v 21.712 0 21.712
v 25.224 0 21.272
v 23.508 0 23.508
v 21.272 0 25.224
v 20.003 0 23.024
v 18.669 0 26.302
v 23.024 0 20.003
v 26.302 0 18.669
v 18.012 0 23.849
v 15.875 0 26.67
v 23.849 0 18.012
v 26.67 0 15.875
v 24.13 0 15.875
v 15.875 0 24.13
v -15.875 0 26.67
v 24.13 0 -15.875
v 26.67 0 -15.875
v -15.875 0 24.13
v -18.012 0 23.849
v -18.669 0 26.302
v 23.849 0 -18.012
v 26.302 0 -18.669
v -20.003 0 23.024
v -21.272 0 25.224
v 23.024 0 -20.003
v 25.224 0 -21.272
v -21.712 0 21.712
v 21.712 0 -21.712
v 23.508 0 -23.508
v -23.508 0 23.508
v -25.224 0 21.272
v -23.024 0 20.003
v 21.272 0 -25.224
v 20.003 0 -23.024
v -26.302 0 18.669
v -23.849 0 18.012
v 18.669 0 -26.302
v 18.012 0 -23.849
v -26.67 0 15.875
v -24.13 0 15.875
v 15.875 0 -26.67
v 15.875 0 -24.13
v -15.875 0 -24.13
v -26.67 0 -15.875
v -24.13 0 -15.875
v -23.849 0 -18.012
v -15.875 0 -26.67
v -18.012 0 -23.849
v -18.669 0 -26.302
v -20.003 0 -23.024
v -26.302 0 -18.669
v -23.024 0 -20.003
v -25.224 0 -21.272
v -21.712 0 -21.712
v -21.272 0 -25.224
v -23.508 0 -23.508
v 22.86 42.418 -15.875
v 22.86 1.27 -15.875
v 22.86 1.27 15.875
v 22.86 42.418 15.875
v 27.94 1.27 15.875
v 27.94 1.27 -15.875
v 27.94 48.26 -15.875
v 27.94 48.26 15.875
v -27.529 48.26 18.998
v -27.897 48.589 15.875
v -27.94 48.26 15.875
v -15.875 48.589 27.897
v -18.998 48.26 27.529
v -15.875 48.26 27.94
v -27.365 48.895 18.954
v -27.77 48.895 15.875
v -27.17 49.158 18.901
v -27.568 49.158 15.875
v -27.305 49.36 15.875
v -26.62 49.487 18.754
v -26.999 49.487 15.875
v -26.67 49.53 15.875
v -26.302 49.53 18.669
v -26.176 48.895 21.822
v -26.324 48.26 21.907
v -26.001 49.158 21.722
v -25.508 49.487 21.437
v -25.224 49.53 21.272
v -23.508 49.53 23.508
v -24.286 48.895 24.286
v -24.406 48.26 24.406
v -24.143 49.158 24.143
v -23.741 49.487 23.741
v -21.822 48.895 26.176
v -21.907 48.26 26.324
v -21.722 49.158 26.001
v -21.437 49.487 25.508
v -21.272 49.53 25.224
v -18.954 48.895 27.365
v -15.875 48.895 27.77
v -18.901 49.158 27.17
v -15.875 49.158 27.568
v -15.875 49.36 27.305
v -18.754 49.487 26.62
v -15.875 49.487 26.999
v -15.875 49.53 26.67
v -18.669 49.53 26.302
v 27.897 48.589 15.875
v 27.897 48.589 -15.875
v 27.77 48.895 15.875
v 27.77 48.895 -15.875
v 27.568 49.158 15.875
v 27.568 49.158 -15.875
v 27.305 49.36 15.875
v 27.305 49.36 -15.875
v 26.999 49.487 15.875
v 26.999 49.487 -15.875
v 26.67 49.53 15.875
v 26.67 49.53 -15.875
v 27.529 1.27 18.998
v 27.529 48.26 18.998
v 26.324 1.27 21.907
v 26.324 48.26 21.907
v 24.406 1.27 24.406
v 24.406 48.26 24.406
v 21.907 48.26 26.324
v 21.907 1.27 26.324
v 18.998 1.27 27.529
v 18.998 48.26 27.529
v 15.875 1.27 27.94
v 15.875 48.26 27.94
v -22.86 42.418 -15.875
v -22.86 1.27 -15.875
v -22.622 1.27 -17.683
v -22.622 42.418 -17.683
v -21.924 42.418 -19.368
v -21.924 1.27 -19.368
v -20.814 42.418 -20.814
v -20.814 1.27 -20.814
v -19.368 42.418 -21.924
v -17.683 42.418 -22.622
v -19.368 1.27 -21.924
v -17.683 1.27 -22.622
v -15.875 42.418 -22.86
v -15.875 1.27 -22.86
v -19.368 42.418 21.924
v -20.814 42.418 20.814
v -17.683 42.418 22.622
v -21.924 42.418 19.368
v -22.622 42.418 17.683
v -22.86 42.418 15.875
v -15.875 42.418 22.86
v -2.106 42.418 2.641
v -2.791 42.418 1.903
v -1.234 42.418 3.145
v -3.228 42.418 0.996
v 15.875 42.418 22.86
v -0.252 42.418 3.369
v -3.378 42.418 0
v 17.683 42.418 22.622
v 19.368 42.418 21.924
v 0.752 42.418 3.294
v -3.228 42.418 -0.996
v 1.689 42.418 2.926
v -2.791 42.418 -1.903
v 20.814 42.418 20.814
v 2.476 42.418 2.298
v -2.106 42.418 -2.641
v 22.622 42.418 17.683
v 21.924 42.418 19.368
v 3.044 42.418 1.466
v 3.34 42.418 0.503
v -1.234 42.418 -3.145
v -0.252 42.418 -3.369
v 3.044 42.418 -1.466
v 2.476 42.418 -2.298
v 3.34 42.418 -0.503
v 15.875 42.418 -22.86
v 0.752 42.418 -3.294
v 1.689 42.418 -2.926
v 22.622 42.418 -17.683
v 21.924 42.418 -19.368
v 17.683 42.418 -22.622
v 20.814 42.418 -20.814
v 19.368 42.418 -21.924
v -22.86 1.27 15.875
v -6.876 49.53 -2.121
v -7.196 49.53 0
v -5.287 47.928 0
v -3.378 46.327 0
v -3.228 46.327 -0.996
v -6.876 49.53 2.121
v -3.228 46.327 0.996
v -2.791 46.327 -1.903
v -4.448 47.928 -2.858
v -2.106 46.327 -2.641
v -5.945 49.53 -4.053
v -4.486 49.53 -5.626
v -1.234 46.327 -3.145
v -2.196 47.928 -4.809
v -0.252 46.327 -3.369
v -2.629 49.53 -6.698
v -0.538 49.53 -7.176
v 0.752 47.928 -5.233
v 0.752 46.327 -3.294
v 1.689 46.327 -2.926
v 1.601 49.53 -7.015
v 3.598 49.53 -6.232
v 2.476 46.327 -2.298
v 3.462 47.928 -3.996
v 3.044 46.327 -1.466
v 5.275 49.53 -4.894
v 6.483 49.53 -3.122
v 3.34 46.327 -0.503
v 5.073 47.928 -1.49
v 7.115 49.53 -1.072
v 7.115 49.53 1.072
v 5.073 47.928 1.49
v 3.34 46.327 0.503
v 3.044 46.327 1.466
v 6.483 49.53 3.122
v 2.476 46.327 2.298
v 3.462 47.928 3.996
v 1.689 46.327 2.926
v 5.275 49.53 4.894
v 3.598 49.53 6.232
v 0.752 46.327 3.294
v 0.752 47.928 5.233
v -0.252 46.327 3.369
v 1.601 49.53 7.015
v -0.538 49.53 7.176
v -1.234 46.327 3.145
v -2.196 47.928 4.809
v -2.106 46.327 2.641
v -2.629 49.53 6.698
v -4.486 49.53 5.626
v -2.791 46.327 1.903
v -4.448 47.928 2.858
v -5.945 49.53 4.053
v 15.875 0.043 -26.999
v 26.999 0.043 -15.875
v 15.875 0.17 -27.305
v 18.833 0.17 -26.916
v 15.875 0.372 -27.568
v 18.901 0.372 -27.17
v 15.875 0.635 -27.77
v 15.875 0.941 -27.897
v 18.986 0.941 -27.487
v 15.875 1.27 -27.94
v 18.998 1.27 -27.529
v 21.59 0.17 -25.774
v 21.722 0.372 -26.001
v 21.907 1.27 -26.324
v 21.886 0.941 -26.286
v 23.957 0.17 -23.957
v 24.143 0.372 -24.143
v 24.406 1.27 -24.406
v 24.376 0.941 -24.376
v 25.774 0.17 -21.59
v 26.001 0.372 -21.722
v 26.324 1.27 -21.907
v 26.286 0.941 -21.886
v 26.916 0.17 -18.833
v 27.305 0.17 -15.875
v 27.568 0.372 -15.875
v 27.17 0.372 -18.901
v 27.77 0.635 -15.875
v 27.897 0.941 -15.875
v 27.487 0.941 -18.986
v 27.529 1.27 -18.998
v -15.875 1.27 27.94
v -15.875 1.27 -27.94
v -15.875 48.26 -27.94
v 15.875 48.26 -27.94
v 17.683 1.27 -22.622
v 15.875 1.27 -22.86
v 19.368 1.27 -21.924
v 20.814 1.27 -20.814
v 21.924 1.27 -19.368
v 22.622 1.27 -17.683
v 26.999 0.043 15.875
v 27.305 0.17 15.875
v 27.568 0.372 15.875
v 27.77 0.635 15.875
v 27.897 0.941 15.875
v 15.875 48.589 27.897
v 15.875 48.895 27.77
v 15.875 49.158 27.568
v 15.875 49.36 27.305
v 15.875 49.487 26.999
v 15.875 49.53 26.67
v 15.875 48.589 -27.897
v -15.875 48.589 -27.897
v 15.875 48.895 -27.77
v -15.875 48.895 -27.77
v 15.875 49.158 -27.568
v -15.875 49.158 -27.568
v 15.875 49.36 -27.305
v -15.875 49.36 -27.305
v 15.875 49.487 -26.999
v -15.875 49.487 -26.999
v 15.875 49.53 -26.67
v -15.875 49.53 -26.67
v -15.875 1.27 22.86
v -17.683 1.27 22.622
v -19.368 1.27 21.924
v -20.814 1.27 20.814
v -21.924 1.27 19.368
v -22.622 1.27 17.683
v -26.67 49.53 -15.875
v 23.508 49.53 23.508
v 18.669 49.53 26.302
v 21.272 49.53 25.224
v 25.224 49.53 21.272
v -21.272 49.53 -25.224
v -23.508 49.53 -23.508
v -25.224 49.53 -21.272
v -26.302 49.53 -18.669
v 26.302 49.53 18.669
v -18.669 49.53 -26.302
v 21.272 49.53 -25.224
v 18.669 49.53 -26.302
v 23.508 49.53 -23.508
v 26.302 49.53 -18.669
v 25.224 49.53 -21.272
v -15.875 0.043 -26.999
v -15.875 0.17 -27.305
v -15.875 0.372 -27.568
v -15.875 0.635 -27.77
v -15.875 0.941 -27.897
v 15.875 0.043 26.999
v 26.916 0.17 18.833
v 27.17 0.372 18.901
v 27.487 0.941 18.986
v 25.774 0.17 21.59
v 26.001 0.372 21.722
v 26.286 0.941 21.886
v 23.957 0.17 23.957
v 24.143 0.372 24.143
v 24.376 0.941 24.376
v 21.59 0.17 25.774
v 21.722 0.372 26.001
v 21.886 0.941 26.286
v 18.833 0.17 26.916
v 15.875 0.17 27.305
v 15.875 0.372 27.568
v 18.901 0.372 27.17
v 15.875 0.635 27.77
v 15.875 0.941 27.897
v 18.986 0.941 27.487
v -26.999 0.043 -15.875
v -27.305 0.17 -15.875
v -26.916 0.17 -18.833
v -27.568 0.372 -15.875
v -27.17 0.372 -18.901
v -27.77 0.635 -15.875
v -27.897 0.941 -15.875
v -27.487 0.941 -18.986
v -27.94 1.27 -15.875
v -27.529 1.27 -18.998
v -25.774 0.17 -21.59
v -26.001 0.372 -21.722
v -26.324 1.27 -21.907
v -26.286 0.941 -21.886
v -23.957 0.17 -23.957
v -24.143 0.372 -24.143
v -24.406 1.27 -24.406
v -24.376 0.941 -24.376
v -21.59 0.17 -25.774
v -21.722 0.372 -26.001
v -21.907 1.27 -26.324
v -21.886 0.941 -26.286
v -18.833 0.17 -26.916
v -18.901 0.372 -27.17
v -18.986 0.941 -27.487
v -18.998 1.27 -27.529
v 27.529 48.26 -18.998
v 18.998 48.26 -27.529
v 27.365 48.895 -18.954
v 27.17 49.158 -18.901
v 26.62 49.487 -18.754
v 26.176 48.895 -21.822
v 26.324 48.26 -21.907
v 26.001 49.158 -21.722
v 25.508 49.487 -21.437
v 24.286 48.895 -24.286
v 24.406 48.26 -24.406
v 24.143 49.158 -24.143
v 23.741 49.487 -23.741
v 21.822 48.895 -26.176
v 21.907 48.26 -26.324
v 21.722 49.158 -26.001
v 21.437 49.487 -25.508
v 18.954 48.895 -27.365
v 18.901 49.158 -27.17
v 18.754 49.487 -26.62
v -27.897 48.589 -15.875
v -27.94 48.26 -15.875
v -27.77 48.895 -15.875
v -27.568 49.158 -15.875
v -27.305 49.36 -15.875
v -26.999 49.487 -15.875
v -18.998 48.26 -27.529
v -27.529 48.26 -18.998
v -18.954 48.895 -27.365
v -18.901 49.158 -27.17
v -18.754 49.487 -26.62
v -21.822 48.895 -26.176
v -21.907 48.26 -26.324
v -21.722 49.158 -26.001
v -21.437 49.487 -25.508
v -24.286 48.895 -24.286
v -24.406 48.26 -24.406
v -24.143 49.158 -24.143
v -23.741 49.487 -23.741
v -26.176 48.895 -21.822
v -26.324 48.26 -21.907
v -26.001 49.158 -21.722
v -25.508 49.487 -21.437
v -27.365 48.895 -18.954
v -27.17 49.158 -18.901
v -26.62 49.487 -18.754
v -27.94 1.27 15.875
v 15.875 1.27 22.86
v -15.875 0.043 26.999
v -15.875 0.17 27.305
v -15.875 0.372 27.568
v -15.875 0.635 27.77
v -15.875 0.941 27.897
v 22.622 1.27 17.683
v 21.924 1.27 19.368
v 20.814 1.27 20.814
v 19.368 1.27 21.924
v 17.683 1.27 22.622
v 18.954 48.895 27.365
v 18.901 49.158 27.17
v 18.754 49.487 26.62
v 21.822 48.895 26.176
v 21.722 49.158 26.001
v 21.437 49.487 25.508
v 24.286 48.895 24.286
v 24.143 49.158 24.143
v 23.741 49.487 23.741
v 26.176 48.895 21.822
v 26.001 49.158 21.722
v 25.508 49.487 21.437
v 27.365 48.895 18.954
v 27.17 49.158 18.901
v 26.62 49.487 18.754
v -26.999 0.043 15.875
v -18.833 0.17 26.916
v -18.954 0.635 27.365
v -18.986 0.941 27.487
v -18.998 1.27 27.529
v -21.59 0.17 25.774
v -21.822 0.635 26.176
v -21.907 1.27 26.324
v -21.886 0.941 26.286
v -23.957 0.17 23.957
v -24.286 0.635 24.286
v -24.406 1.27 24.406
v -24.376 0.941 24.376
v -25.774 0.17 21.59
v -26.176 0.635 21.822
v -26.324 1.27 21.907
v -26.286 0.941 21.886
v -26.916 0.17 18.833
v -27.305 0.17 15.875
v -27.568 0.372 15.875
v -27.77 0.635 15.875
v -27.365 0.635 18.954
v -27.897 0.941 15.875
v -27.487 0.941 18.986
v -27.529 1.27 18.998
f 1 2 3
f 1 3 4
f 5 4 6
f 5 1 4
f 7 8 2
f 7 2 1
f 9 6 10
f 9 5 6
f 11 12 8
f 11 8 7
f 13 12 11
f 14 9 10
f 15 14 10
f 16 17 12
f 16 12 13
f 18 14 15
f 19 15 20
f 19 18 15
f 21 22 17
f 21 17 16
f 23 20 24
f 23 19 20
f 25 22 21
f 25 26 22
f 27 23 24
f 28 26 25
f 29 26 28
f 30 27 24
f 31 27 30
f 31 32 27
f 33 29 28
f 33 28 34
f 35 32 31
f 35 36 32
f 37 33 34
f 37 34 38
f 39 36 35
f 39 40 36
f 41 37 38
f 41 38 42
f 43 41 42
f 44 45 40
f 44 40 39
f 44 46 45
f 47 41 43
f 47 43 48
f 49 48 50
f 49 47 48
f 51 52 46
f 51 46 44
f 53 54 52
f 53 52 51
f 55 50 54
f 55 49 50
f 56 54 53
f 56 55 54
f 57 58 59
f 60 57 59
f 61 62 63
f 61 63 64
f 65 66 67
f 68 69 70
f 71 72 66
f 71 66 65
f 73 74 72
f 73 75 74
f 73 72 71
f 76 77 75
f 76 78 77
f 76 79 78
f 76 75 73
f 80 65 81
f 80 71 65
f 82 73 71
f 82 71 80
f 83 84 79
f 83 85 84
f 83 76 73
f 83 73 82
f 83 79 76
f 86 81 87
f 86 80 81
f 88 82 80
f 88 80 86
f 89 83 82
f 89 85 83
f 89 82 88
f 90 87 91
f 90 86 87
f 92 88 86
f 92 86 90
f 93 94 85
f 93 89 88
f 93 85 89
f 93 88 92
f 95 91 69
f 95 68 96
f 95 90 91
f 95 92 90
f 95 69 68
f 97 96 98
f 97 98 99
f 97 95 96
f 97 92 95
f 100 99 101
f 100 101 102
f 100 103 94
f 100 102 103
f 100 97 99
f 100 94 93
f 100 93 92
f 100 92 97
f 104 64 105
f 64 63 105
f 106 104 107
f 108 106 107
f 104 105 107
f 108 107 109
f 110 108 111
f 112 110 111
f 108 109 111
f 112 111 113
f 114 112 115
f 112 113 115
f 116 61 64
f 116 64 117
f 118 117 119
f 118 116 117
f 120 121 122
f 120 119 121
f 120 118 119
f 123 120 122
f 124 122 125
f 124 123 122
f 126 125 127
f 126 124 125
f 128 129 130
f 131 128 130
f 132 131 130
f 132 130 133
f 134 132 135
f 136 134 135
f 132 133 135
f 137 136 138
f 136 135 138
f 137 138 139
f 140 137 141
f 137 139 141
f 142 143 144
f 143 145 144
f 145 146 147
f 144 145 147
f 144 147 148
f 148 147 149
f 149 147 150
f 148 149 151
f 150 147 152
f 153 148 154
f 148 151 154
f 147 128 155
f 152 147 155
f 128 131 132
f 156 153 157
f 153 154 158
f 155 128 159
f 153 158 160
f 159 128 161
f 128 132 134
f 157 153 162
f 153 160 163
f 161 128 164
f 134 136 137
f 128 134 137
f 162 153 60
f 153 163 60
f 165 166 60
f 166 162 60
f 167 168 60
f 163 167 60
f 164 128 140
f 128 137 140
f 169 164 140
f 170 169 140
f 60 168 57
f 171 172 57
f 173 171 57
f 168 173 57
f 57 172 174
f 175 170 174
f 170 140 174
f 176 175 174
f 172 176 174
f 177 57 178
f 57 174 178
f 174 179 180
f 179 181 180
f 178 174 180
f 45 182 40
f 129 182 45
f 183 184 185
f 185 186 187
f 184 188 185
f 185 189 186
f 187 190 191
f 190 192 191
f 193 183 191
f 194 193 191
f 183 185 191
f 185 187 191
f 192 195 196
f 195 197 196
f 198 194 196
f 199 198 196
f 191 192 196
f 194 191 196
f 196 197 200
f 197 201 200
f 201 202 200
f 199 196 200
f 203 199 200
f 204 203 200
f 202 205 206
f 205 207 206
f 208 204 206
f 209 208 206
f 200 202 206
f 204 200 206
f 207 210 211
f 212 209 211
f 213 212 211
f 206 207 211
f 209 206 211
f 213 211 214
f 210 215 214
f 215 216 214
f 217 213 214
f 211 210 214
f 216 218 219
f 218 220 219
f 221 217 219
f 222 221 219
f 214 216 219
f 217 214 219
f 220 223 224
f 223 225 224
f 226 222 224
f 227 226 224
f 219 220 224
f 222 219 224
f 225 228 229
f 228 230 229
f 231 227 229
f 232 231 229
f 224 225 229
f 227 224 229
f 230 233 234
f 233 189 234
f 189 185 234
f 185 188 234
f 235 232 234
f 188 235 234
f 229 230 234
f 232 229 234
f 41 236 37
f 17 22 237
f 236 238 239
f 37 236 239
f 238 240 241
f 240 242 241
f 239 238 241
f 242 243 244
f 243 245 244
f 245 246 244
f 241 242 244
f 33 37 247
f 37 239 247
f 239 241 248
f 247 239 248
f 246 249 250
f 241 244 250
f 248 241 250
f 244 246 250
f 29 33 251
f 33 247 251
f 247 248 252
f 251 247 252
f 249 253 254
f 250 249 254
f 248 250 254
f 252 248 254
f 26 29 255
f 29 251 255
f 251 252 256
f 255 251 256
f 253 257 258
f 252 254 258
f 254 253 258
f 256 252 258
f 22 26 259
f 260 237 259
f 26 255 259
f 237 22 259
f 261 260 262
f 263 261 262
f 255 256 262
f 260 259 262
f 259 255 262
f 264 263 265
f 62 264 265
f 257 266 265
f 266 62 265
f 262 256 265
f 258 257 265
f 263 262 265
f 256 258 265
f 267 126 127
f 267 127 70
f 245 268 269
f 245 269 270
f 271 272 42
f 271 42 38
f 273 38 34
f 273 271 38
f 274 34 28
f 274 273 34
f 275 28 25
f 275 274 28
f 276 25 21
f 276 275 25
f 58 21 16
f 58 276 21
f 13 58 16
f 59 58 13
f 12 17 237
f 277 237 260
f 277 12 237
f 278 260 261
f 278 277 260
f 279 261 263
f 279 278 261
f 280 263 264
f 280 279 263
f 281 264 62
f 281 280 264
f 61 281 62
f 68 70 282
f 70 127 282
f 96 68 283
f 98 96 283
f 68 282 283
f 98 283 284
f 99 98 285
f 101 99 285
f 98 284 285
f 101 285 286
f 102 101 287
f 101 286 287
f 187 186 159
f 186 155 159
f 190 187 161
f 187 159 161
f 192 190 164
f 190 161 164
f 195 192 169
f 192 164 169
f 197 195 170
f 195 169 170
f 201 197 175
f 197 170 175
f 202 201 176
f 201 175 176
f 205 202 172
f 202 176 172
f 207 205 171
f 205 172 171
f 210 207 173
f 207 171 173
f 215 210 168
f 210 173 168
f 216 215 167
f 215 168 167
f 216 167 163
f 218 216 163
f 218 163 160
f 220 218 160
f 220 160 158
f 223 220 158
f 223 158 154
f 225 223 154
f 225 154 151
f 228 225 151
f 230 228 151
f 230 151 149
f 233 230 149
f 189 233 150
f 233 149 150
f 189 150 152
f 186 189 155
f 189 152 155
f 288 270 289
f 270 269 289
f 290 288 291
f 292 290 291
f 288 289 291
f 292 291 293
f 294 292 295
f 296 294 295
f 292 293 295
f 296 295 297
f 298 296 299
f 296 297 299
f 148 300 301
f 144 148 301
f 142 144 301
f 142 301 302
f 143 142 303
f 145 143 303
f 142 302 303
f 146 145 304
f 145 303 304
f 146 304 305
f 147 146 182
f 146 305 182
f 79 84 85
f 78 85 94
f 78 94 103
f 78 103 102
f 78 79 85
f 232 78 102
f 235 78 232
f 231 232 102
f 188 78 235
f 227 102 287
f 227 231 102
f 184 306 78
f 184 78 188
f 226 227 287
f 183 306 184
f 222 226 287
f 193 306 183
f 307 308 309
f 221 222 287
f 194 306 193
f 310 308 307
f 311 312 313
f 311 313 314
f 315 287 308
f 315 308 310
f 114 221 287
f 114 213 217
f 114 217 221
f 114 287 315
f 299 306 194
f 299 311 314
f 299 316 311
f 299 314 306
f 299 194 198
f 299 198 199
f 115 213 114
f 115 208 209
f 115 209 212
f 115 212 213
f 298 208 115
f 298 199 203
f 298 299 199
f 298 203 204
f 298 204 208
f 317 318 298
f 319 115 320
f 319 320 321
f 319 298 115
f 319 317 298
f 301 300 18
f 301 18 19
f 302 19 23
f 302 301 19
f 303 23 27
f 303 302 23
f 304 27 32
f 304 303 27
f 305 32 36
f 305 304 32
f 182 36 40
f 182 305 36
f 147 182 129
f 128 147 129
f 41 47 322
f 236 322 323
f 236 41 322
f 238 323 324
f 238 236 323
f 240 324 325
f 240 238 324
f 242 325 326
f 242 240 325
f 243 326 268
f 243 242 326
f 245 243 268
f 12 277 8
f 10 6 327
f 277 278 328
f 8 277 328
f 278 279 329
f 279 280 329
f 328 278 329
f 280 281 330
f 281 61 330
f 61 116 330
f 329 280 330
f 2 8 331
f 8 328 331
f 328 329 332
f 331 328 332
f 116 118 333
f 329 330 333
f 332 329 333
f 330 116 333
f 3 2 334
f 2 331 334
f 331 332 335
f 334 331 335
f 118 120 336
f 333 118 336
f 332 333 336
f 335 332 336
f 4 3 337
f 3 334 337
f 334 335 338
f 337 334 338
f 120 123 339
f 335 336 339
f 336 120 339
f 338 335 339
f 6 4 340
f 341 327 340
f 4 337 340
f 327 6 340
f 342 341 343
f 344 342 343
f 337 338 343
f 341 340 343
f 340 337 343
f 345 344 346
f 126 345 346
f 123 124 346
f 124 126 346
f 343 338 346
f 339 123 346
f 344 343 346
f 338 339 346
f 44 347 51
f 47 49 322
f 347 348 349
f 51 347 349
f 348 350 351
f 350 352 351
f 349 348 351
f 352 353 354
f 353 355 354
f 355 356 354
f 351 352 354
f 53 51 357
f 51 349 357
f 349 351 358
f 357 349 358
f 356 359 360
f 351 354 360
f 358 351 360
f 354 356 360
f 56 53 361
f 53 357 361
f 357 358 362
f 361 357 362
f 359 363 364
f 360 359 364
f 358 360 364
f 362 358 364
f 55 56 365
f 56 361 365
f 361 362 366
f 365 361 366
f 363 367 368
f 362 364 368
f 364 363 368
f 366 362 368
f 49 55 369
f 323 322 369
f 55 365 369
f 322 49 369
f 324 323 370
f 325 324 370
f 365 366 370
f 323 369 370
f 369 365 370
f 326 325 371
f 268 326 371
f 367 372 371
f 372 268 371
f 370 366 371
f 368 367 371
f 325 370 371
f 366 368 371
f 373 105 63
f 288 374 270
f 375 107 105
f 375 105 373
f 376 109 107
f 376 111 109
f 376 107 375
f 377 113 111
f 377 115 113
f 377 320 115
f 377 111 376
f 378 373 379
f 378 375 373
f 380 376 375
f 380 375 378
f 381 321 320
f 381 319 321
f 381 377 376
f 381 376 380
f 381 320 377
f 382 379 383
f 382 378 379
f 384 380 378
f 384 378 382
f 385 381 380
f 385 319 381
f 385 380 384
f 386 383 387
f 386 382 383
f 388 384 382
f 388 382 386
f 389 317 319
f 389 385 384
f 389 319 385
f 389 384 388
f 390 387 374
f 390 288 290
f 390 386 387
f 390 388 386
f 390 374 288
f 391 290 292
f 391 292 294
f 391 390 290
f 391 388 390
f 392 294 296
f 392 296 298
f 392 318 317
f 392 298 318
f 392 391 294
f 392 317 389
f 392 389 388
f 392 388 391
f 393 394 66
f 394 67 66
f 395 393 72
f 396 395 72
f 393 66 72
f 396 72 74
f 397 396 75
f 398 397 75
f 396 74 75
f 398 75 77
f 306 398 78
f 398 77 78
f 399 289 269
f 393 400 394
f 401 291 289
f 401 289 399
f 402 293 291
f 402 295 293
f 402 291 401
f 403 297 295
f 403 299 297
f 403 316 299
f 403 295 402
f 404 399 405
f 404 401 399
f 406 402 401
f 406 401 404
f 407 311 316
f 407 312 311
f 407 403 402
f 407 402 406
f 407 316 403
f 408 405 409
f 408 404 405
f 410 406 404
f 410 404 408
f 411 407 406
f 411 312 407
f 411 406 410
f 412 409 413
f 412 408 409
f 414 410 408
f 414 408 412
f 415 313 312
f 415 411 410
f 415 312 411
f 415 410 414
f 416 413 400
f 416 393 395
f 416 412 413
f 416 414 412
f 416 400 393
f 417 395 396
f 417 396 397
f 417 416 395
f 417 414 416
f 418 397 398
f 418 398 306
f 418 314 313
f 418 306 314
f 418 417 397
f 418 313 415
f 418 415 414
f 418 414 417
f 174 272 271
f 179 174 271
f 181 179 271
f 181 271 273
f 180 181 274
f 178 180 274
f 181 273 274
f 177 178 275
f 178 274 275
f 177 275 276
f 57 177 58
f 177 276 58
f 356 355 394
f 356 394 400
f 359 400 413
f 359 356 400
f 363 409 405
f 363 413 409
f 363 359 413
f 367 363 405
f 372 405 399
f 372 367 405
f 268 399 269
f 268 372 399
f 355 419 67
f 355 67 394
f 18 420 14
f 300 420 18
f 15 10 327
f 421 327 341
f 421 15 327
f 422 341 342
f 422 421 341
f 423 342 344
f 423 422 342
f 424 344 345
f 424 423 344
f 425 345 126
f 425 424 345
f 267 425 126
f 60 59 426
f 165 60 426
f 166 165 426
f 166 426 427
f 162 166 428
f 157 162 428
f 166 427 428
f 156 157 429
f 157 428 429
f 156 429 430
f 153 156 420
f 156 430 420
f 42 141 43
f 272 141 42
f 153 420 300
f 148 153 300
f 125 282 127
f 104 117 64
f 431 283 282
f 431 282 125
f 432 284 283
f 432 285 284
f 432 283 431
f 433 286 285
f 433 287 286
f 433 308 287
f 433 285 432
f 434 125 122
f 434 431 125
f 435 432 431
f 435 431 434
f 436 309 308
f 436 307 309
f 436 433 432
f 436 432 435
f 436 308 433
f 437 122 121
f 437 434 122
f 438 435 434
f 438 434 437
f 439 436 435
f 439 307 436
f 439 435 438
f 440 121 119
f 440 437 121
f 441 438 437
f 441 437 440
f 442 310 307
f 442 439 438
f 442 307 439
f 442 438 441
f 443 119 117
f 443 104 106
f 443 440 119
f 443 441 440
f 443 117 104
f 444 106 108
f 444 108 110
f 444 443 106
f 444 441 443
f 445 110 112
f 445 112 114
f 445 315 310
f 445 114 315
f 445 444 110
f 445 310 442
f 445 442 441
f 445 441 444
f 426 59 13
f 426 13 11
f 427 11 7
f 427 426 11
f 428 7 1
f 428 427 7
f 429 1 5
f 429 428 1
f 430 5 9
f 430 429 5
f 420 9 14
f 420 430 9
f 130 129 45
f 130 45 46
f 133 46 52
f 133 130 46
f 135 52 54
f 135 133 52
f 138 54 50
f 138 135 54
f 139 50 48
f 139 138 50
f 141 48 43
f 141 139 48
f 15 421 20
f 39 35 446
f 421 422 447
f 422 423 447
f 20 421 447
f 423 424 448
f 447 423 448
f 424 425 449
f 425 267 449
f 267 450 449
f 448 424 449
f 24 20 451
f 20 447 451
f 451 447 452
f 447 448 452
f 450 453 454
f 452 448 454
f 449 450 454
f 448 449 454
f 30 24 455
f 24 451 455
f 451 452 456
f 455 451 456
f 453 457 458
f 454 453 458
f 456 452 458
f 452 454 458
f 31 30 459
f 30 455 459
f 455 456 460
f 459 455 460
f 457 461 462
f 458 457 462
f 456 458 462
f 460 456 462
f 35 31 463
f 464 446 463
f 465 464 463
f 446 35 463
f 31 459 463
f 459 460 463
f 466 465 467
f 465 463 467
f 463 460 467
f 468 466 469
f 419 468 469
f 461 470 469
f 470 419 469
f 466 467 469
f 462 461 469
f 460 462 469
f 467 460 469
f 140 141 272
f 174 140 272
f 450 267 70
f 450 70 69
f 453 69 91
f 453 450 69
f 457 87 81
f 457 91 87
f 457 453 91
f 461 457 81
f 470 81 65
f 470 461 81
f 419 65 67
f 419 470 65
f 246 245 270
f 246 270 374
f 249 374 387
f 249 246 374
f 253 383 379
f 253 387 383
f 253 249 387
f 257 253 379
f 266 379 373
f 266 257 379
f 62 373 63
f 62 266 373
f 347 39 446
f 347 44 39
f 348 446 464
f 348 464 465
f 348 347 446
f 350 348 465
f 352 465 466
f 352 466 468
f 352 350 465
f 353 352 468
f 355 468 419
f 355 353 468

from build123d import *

# Parameters (mm, degrees)
BOSS_EXTRUDE1_DEPTH                                 = 6.35
BOSS_EXTRUDE1_DEPTH_BACK                            = 0.762
BOSS_EXTRUDE2_DEPTH                                 = 42.418
CSK_FOR_1_4_FLAT_HEAD_MACHINE_SCREW_100_D           = 6.7564
CSK_FOR_1_4_FLAT_HEAD_MACHINE_SCREW_100_CSINK_D     = 14.3913352
CSK_FOR_1_4_FLAT_HEAD_MACHINE_SCREW_100_CSINK_ANGLE = 100
FILLET1_R                                           = 1.27
CHAMFER1_SIZE                                       = 1.27
FILLET2_R                                           = 1.27


with BuildPart() as part:
    # Sketch2 → Boss-Extrude1 (new, two sides: drawn at the far end of the back side and taken through both)
    with BuildSketch(Plane(origin=(0, 43.18, 0), x_dir=(1, 0, 0), z_dir=(0, 1, 0)).offset(-BOSS_EXTRUDE1_DEPTH_BACK)):
        with BuildLine():
            Line((-27.94, 15.875), (-27.94, -15.875))
            ThreePointArc((-27.94, -15.875), (-24.406243315, -24.406243315), (-15.875, -27.94))
            Line((-15.875, -27.94), (15.875, -27.94))
            ThreePointArc((15.875, -27.94), (24.406243315, -24.406243315), (27.94, -15.875))
            Line((27.94, -15.875), (27.94, 15.875))
            ThreePointArc((27.94, 15.875), (24.406243315, 24.406243315), (15.875, 27.94))
            Line((15.875, 27.94), (-15.875, 27.94))
            ThreePointArc((-15.875, 27.94), (-24.406243315, 24.406243315), (-27.94, 15.875))
        make_face()
    extrude(amount=BOSS_EXTRUDE1_DEPTH + BOSS_EXTRUDE1_DEPTH_BACK)

    # Sketch1 → Boss-Extrude2 (add)
    with BuildSketch(Plane(origin=(0, 0, 0), x_dir=(1, 0, 0), z_dir=(0, 1, 0))):
        with BuildLine():
            Line((-27.94, -15.875), (-27.94, 15.875))
            ThreePointArc((-27.94, 15.875), (-24.406243315, 24.406243315), (-15.875, 27.94))
            Line((-15.875, 27.94), (15.875, 27.94))
            ThreePointArc((15.875, 27.94), (24.406243315, 24.406243315), (27.94, 15.875))
            Line((27.94, 15.875), (27.94, -15.875))
            ThreePointArc((27.94, -15.875), (24.406243315, -24.406243315), (15.875, -27.94))
            Line((15.875, -27.94), (-15.875, -27.94))
            ThreePointArc((-15.875, -27.94), (-24.406243315, -24.406243315), (-27.94, -15.875))
        make_face()
        with BuildLine():
            Line((-22.86, -15.875), (-22.86, 15.875))
            ThreePointArc((-22.86, 15.875), (-20.814140867, 20.814140867), (-15.875, 22.86))
            Line((-15.875, 22.86), (15.875, 22.86))
            ThreePointArc((15.875, 22.86), (20.814140867, 20.814140867), (22.86, 15.875))
            Line((22.86, 15.875), (22.86, -15.875))
            ThreePointArc((22.86, -15.875), (20.814140867, -20.814140867), (15.875, -22.86))
            Line((15.875, -22.86), (-15.875, -22.86))
            ThreePointArc((-15.875, -22.86), (-20.814140867, -20.814140867), (-22.86, -15.875))
        make_face(mode=Mode.SUBTRACT)
    extrude(amount=BOSS_EXTRUDE2_DEPTH)

    # CSK for 1/4 Flat Head Machine Screw (100)1 (through all)
    with Locations(Plane(origin=(0, 49.53, 0), x_dir=(1, 0, 0), z_dir=(0, 1, 0))):
        with Locations((0, 0)):
            CounterSinkHole(CSK_FOR_1_4_FLAT_HEAD_MACHINE_SCREW_100_D / 2, CSK_FOR_1_4_FLAT_HEAD_MACHINE_SCREW_100_CSINK_D / 2, counter_sink_angle=CSK_FOR_1_4_FLAT_HEAD_MACHINE_SCREW_100_CSINK_ANGLE)

    # Fillet1
    fillet1_edges = [part.edges().sort_by_distance(p)[0] for p in [
        (24.406243315, 49.53, 24.406243315),
        (27.94, 49.53, 0),
        (24.406243315, 49.53, -24.406243315),
        (0, 49.53, -27.94),
        (-24.406243315, 49.53, -24.406243315),
        (-27.94, 49.53, 0),
        (-24.406243315, 49.53, 24.406243315),
        (0, 49.53, 27.94),
    ]]
    fillet(fillet1_edges, radius=FILLET1_R)

    # Chamfer1
    chamfer1_edges = [part.edges().sort_by_distance(p)[0] for p in [
        (-22.86, 0, 0),
        (-20.814140867, 0, 20.814140867),
        (0, 0, 22.86),
        (20.814140867, 0, 20.814140867),
        (22.86, 0, 0),
        (20.814140867, 0, -20.814140867),
        (0, 0, -22.86),
        (-20.814140867, 0, -20.814140867),
    ]]
    chamfer(chamfer1_edges, length=CHAMFER1_SIZE)

    # Fillet2
    fillet2_edges = [part.edges().sort_by_distance(p)[0] for p in [
        (-27.94, 0, 0),
        (-24.406243315, 0, -24.406243315),
        (0, 0, -27.94),
        (24.406243315, 0, -24.406243315),
        (27.94, 0, 0),
        (24.406243315, 0, 24.406243315),
        (0, 0, 27.94),
        (-24.406243315, 0, 24.406243315),
    ]]
    fillet(fillet2_edges, radius=FILLET2_R)


solid = part.part
